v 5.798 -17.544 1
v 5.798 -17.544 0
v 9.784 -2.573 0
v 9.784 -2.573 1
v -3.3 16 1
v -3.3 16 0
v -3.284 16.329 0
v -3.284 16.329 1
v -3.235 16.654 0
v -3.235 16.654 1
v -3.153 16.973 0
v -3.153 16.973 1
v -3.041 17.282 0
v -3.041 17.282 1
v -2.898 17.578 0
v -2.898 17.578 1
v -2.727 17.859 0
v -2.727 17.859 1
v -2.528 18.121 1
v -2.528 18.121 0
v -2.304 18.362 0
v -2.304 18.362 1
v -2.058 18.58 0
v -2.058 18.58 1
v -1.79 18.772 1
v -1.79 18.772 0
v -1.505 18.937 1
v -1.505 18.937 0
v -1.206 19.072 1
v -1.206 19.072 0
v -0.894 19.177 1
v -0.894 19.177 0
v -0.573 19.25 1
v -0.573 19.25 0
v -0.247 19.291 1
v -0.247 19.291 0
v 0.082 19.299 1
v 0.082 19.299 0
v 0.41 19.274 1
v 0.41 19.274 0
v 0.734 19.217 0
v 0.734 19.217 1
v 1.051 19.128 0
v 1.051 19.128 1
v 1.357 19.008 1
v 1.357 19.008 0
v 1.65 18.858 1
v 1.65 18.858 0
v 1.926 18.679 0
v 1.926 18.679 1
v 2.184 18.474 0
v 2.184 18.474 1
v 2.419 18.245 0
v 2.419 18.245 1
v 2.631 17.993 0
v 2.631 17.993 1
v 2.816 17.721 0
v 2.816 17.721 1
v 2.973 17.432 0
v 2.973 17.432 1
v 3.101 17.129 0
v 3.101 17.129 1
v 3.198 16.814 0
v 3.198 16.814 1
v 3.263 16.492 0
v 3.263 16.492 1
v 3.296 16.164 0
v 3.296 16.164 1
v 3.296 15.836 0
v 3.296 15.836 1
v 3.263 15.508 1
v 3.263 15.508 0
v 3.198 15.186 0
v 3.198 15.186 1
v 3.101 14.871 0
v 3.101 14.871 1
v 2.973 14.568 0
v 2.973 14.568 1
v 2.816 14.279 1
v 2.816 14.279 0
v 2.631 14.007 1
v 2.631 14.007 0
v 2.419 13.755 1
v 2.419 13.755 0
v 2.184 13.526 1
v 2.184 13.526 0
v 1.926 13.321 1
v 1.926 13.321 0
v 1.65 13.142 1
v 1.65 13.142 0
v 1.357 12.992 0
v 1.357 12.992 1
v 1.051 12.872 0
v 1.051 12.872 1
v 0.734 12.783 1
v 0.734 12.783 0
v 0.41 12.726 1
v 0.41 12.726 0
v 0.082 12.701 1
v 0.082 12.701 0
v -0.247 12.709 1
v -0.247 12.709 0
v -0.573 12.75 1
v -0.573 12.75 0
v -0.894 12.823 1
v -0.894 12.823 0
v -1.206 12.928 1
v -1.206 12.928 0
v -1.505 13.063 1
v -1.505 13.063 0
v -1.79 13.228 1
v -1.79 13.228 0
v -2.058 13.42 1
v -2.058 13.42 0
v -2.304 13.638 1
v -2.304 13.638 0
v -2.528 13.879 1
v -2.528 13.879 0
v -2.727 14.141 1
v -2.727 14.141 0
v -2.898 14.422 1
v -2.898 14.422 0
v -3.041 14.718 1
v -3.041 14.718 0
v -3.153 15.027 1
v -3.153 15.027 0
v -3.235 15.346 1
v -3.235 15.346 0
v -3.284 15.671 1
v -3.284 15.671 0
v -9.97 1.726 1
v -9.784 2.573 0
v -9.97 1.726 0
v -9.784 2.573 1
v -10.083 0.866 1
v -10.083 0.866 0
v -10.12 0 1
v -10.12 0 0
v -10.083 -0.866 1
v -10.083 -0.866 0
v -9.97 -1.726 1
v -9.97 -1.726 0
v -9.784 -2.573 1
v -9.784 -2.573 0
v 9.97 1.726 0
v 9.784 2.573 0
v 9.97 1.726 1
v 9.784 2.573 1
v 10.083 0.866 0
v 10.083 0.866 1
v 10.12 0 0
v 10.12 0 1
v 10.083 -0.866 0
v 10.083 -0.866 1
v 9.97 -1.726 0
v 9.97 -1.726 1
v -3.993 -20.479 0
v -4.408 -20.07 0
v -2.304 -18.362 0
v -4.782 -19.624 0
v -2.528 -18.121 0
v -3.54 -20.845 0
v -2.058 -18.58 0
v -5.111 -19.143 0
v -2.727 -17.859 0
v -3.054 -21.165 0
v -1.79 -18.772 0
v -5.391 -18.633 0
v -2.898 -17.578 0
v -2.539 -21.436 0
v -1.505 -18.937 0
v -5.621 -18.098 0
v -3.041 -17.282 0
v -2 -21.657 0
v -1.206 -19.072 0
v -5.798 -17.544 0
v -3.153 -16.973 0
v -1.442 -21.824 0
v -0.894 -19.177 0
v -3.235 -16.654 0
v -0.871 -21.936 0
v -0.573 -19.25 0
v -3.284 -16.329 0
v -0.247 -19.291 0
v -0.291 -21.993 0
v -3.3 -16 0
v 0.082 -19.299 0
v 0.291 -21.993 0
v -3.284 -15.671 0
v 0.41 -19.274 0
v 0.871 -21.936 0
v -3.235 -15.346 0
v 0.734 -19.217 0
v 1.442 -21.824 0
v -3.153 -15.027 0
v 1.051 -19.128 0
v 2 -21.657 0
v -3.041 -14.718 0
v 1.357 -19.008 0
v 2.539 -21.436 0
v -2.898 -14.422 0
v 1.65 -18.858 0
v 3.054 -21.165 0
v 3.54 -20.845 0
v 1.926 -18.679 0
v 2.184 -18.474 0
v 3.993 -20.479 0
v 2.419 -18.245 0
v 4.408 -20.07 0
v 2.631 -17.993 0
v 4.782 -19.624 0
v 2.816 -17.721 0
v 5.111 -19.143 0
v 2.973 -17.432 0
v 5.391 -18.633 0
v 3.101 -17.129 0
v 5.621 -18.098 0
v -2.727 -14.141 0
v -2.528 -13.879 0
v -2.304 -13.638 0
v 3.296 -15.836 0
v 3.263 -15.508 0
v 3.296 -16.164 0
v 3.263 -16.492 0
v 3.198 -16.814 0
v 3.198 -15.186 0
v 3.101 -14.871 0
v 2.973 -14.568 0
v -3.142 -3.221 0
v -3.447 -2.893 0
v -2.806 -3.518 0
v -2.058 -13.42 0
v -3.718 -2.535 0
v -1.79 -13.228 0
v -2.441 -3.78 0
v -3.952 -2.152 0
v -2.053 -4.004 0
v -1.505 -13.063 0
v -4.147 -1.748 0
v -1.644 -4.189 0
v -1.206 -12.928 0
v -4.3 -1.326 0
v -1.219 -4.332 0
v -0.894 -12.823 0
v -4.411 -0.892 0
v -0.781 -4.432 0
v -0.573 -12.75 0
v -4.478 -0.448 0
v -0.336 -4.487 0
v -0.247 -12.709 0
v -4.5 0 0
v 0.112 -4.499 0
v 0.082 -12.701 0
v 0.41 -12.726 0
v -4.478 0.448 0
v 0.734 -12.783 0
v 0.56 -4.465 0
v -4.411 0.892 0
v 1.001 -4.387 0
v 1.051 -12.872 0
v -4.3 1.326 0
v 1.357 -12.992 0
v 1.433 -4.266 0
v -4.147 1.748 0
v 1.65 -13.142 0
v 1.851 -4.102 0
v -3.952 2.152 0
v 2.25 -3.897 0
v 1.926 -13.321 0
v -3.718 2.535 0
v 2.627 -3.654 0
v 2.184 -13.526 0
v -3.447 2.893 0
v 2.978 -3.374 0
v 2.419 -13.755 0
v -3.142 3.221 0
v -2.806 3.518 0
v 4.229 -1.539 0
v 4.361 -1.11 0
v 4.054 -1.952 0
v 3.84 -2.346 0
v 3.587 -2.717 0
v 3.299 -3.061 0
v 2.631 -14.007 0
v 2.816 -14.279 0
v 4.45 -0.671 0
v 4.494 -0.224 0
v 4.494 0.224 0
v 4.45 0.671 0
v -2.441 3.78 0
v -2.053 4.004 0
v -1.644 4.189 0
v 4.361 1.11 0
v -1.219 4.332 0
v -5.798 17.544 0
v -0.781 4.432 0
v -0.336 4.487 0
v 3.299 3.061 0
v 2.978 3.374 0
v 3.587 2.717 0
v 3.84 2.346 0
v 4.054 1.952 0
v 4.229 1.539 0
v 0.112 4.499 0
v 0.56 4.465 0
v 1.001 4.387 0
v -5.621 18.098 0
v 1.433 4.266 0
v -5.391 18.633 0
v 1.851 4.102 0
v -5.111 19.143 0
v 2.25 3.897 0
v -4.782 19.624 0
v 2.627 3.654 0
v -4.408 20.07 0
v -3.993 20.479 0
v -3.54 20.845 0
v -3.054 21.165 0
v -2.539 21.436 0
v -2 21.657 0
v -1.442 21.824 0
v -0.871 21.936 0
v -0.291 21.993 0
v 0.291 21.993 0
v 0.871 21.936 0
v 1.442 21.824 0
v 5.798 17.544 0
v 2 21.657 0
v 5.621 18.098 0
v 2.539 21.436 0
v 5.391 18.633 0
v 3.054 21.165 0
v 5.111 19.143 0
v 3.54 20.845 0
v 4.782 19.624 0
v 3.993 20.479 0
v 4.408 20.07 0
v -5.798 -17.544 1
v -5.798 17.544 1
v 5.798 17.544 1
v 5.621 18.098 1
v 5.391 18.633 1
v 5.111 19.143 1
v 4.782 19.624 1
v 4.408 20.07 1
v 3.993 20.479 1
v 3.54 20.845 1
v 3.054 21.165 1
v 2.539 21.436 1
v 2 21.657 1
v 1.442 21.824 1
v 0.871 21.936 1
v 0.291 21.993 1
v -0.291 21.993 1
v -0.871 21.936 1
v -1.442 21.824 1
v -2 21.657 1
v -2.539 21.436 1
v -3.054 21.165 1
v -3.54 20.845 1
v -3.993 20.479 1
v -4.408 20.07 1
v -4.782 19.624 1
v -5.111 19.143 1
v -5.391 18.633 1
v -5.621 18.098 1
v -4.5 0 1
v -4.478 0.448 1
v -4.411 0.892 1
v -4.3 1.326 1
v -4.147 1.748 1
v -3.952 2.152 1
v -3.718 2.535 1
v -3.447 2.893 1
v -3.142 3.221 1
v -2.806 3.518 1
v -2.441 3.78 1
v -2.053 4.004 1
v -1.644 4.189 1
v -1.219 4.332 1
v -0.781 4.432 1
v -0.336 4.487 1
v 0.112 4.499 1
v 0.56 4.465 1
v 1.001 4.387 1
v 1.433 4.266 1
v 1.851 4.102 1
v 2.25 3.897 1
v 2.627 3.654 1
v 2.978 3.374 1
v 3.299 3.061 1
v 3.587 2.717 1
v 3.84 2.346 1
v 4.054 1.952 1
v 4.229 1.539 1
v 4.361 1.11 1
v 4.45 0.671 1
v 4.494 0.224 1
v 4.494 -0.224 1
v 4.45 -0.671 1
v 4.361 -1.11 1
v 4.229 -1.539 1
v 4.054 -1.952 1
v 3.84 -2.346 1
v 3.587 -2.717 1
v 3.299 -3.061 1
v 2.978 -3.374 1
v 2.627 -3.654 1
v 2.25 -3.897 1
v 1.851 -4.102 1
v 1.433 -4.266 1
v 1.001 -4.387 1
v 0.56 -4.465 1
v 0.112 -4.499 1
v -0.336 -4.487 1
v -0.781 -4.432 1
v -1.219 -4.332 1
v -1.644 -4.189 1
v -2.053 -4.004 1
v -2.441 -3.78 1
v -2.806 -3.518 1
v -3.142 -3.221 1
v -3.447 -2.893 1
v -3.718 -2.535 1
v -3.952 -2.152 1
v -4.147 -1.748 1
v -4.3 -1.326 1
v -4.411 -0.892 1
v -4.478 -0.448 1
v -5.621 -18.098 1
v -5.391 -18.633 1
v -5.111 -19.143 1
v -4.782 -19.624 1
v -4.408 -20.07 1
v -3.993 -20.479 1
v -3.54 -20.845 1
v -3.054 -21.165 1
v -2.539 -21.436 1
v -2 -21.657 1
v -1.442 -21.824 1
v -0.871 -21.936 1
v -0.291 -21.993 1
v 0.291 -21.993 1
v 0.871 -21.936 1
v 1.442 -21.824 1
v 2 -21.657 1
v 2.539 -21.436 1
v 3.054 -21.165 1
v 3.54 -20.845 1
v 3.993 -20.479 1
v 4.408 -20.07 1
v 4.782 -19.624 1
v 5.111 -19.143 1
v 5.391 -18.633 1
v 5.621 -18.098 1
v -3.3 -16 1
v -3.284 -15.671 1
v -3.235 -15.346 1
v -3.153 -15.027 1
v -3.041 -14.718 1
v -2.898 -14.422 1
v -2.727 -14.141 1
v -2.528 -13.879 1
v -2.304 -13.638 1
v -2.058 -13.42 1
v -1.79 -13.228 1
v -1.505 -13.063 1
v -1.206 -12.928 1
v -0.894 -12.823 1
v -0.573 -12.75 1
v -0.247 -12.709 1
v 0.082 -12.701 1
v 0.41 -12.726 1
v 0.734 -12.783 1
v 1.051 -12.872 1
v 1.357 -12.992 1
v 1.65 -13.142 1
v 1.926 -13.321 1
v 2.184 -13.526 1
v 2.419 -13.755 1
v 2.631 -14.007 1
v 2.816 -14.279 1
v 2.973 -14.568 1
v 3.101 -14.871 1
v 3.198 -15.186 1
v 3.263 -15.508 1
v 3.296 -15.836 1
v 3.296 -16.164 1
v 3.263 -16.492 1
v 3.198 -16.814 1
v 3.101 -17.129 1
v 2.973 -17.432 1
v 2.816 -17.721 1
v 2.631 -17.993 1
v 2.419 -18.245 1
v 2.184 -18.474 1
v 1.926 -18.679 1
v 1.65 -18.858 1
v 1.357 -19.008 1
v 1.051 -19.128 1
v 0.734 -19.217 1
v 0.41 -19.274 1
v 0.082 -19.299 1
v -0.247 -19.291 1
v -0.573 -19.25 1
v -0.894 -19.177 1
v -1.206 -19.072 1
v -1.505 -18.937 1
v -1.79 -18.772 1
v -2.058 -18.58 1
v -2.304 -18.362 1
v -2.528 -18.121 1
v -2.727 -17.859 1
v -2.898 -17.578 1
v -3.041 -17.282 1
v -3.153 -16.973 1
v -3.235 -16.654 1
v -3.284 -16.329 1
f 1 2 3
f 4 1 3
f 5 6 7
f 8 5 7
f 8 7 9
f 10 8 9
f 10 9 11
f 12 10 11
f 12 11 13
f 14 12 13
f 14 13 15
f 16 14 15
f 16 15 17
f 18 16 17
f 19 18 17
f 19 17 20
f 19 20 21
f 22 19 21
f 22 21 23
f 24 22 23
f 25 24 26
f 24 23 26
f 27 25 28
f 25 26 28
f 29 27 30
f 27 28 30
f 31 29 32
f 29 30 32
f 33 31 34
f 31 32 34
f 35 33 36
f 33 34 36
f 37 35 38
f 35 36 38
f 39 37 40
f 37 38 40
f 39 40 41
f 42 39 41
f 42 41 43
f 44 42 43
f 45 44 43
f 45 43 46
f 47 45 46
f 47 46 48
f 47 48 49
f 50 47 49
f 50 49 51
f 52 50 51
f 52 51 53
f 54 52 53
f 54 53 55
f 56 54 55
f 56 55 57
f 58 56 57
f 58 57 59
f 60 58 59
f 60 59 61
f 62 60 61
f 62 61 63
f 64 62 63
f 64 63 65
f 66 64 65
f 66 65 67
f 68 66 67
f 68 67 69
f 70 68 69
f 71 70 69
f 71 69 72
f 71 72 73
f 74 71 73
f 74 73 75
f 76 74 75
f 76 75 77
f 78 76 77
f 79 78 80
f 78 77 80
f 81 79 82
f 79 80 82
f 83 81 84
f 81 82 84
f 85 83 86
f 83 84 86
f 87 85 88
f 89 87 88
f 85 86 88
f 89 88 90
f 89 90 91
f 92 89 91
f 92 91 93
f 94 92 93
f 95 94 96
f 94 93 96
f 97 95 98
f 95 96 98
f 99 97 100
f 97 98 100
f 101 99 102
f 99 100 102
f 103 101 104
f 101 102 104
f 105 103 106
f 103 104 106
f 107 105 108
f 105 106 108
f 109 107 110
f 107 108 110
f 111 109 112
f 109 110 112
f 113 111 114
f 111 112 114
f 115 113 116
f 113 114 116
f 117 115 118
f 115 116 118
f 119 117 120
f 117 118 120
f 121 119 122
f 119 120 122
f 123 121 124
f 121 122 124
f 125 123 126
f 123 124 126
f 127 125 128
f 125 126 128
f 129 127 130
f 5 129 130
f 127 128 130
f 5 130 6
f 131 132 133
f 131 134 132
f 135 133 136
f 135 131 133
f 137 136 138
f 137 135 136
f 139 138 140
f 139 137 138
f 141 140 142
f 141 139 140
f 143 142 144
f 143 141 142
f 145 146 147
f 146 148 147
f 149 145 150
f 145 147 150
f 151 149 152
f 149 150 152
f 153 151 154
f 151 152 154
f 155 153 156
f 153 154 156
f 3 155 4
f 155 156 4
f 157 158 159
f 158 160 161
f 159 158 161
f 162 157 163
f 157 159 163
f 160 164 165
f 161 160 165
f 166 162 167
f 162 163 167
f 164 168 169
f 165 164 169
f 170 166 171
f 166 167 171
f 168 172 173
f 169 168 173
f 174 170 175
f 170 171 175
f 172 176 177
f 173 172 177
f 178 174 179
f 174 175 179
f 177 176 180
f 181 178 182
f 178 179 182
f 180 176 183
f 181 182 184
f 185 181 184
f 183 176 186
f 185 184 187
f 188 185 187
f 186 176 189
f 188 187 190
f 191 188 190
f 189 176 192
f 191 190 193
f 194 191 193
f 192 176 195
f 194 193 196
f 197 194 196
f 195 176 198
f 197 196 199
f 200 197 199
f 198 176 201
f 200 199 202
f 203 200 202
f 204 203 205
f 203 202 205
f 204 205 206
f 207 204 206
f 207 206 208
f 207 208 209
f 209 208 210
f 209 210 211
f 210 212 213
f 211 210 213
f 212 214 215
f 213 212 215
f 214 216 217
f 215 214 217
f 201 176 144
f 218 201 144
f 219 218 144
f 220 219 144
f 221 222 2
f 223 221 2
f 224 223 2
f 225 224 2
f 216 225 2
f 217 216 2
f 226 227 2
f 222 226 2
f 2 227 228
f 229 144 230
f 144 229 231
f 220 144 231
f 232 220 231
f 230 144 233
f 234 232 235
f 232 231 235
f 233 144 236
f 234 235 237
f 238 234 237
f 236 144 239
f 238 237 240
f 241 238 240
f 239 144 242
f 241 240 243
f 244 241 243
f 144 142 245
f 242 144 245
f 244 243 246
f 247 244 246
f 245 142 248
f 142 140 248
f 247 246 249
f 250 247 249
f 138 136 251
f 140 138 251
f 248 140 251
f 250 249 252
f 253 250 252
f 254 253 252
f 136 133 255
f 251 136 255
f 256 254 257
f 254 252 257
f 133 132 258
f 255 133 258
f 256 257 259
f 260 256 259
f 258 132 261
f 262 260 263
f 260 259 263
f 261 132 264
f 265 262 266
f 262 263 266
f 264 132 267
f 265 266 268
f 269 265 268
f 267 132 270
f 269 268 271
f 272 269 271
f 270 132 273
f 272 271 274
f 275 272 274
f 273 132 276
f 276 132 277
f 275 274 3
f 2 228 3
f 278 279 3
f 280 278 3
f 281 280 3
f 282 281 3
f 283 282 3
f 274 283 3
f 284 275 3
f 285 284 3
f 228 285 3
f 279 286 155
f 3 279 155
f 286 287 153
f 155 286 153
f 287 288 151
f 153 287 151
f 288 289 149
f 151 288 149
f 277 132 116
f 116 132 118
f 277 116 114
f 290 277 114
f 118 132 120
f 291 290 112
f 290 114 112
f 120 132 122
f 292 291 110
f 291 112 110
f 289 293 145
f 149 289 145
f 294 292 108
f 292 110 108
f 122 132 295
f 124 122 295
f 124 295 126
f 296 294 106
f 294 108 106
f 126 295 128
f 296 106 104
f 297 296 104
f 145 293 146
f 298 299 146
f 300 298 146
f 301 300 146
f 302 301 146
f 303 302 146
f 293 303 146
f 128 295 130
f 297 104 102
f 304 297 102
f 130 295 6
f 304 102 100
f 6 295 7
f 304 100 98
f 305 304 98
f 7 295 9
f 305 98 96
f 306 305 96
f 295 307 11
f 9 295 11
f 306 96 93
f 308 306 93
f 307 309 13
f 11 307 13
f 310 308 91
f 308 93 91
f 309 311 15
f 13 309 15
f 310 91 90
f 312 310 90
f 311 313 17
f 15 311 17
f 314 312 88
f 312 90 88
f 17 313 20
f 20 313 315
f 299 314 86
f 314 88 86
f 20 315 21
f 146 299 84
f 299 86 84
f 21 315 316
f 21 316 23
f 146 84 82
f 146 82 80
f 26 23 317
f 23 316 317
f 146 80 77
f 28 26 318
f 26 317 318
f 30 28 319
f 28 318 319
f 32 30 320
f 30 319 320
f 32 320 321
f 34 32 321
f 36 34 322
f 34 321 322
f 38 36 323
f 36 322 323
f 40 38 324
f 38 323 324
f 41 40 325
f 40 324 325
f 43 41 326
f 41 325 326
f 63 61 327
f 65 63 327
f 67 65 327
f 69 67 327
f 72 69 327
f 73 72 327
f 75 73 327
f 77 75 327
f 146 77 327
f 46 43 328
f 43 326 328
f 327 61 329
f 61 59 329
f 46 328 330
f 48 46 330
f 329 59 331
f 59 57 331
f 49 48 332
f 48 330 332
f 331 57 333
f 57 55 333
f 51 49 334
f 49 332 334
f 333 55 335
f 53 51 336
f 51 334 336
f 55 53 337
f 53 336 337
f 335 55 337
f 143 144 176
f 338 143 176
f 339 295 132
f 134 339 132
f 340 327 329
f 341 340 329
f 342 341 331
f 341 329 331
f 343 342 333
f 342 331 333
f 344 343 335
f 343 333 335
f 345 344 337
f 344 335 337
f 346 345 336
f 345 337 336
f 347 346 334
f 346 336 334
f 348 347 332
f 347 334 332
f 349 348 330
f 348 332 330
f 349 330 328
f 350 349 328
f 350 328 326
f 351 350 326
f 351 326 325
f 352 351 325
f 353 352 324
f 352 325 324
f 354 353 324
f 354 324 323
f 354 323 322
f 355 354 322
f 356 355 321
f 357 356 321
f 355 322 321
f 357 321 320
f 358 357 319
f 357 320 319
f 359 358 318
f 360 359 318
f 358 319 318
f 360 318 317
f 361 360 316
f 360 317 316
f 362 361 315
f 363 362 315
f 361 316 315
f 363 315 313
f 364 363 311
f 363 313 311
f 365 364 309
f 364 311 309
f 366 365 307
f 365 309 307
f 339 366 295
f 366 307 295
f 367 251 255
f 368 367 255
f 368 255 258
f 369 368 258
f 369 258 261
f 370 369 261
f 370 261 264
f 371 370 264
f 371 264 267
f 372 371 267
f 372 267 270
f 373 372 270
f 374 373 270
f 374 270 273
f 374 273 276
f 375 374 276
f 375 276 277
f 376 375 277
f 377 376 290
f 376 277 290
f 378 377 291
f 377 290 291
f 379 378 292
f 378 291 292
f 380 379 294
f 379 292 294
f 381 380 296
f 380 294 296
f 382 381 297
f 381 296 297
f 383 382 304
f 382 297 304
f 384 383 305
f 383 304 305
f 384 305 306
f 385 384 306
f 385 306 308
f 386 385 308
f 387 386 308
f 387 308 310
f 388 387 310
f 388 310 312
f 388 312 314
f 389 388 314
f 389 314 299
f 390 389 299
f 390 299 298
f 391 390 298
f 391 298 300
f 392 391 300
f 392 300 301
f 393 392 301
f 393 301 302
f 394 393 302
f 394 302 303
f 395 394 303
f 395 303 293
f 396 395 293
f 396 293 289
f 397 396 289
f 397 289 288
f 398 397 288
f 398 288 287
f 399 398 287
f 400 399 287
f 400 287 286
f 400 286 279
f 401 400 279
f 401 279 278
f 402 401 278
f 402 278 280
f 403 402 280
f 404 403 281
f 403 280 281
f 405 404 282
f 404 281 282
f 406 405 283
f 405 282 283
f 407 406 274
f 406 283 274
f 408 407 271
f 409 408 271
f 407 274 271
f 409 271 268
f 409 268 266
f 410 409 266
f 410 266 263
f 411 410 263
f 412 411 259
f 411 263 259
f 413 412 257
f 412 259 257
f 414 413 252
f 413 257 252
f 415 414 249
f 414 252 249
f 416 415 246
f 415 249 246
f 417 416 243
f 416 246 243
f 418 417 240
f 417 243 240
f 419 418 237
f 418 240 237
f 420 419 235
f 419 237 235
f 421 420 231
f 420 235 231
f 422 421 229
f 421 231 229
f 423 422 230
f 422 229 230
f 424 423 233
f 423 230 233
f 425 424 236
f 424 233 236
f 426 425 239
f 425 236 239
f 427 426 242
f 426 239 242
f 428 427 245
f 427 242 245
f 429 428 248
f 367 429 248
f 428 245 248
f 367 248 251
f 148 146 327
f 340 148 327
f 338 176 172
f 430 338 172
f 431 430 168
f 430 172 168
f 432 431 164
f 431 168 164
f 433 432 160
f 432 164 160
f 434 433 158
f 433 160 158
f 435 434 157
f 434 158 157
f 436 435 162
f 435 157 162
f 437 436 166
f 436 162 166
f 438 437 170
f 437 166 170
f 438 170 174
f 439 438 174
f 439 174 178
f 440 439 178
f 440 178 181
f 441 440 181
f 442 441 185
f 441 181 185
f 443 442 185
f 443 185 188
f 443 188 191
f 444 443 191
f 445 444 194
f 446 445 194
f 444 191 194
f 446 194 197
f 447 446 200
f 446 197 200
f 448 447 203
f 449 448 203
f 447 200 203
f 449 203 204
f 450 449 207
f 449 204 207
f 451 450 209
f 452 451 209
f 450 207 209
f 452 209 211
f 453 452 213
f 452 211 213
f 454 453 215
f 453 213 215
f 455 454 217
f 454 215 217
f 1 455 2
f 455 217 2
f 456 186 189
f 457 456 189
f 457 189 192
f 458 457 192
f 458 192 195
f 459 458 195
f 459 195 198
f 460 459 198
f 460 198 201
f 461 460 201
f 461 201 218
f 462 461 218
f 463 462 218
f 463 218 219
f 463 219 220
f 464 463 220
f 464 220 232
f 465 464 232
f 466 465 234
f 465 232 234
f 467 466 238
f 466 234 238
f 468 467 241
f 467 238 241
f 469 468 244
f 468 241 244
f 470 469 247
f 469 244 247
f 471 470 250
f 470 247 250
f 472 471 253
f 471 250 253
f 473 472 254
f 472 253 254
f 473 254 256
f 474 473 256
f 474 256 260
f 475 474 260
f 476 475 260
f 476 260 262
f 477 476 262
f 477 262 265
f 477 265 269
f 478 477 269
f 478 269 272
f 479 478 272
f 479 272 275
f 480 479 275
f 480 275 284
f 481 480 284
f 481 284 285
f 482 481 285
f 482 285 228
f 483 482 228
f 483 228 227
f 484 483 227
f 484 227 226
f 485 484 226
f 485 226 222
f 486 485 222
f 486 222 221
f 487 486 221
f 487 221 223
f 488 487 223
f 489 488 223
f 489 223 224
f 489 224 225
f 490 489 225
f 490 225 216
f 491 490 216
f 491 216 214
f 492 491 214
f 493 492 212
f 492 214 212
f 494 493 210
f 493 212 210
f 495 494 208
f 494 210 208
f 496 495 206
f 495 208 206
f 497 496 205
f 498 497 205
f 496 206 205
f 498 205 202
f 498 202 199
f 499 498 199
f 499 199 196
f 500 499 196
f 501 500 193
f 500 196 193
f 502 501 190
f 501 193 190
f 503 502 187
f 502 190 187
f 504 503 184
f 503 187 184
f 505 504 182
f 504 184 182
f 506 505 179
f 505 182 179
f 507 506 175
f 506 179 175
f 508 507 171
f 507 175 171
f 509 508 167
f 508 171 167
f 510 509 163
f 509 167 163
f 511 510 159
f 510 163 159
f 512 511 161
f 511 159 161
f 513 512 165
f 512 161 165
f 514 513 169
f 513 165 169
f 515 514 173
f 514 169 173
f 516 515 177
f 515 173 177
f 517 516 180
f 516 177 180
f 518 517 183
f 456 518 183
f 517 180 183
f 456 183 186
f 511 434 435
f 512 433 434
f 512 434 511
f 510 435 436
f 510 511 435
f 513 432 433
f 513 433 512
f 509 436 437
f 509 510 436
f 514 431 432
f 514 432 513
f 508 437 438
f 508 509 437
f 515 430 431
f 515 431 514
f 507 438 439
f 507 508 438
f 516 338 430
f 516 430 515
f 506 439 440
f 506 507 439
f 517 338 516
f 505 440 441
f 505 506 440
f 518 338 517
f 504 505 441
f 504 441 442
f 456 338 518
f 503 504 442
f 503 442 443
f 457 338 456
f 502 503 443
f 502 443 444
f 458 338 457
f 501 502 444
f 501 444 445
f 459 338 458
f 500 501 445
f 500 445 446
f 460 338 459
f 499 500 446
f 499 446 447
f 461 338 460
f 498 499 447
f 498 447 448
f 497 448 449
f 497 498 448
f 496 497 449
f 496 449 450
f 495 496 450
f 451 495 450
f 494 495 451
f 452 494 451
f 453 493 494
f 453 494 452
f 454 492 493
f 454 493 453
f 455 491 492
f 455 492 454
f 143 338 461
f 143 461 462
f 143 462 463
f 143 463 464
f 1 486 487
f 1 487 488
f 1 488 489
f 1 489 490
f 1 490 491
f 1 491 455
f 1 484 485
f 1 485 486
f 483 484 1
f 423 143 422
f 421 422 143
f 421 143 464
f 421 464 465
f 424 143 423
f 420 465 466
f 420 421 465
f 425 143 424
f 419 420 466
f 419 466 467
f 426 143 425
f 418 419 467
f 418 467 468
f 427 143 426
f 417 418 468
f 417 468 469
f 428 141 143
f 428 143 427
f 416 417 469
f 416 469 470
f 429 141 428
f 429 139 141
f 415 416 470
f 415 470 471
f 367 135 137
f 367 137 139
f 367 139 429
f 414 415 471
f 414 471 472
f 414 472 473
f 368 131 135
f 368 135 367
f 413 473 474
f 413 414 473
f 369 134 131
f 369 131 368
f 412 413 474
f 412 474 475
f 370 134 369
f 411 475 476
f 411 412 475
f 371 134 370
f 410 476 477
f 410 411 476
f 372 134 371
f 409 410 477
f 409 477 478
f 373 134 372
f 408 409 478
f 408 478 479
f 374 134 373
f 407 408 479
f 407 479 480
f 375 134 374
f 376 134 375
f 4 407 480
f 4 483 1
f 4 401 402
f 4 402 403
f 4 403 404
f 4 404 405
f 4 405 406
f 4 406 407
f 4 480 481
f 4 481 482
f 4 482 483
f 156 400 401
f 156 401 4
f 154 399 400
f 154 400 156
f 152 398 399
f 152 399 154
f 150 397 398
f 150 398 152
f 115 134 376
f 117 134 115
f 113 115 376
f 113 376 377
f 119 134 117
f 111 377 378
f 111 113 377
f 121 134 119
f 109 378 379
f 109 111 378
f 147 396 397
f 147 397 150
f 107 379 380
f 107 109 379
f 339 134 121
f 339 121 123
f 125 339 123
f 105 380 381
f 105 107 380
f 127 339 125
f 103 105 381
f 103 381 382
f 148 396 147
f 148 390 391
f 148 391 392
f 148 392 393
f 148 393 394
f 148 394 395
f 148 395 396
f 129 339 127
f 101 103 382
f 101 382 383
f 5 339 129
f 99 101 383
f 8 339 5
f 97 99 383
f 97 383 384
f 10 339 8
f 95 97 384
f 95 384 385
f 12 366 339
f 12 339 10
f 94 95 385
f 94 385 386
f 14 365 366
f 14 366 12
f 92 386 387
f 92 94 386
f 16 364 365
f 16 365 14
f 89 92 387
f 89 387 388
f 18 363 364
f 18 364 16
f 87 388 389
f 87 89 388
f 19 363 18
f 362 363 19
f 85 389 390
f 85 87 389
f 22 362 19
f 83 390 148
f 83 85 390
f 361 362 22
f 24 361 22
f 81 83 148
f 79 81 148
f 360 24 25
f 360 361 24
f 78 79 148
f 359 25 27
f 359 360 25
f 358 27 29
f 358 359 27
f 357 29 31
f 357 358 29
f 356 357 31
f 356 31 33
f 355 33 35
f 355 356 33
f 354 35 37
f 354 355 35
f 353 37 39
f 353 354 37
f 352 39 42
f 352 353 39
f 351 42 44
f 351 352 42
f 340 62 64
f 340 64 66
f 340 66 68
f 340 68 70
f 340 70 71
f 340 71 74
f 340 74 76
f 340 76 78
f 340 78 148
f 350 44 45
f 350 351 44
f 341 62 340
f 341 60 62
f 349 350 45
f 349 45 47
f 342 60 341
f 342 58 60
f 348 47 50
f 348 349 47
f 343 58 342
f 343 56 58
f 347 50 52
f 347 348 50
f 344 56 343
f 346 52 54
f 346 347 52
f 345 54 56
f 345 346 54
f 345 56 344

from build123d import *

# Parameters (mm, degrees)
F1_DEPTH = 1
F2_R     = 10
F4_D     = 9
F5_D     = 6.6


with BuildPart() as f1:
    # F0 (on Top) → F1 (new body)
    with BuildSketch(Plane.XY):
        with BuildLine():
            Line((10.468547, 0), (5.79805, 17.543572))
            ThreePointArc((5.79805, 17.543572), (0, 22), (-5.79805, 17.543572))
            Line((-5.79805, 17.543572), (-10.468547, 0))
            Line((-10.468547, 0), (-5.79805, -17.543572))
            ThreePointArc((-5.79805, -17.543572), (0, -22), (5.79805, -17.543572))
            Line((5.79805, -17.543572), (10.468547, 0))
        make_face()
    extrude(amount=F1_DEPTH)

    # F2
    f2_edges = [f1.edges().sort_by_distance(p)[0] for p in [
        (10.468547, 0, 0.5),
        (-10.468547, 0, 0.5),
    ]]
    fillet(f2_edges, radius=F2_R)

    # F4 (through all)
    with Locations(Plane.XY.offset(1)):
        with Locations((0, 0)):
            Hole(F4_D / 2)

    # F5 (through all)
    with Locations(Plane.XY.offset(1)):
        with Locations((0, 16), (0, -16)):
            Hole(F5_D / 2)


solid = f1.part
